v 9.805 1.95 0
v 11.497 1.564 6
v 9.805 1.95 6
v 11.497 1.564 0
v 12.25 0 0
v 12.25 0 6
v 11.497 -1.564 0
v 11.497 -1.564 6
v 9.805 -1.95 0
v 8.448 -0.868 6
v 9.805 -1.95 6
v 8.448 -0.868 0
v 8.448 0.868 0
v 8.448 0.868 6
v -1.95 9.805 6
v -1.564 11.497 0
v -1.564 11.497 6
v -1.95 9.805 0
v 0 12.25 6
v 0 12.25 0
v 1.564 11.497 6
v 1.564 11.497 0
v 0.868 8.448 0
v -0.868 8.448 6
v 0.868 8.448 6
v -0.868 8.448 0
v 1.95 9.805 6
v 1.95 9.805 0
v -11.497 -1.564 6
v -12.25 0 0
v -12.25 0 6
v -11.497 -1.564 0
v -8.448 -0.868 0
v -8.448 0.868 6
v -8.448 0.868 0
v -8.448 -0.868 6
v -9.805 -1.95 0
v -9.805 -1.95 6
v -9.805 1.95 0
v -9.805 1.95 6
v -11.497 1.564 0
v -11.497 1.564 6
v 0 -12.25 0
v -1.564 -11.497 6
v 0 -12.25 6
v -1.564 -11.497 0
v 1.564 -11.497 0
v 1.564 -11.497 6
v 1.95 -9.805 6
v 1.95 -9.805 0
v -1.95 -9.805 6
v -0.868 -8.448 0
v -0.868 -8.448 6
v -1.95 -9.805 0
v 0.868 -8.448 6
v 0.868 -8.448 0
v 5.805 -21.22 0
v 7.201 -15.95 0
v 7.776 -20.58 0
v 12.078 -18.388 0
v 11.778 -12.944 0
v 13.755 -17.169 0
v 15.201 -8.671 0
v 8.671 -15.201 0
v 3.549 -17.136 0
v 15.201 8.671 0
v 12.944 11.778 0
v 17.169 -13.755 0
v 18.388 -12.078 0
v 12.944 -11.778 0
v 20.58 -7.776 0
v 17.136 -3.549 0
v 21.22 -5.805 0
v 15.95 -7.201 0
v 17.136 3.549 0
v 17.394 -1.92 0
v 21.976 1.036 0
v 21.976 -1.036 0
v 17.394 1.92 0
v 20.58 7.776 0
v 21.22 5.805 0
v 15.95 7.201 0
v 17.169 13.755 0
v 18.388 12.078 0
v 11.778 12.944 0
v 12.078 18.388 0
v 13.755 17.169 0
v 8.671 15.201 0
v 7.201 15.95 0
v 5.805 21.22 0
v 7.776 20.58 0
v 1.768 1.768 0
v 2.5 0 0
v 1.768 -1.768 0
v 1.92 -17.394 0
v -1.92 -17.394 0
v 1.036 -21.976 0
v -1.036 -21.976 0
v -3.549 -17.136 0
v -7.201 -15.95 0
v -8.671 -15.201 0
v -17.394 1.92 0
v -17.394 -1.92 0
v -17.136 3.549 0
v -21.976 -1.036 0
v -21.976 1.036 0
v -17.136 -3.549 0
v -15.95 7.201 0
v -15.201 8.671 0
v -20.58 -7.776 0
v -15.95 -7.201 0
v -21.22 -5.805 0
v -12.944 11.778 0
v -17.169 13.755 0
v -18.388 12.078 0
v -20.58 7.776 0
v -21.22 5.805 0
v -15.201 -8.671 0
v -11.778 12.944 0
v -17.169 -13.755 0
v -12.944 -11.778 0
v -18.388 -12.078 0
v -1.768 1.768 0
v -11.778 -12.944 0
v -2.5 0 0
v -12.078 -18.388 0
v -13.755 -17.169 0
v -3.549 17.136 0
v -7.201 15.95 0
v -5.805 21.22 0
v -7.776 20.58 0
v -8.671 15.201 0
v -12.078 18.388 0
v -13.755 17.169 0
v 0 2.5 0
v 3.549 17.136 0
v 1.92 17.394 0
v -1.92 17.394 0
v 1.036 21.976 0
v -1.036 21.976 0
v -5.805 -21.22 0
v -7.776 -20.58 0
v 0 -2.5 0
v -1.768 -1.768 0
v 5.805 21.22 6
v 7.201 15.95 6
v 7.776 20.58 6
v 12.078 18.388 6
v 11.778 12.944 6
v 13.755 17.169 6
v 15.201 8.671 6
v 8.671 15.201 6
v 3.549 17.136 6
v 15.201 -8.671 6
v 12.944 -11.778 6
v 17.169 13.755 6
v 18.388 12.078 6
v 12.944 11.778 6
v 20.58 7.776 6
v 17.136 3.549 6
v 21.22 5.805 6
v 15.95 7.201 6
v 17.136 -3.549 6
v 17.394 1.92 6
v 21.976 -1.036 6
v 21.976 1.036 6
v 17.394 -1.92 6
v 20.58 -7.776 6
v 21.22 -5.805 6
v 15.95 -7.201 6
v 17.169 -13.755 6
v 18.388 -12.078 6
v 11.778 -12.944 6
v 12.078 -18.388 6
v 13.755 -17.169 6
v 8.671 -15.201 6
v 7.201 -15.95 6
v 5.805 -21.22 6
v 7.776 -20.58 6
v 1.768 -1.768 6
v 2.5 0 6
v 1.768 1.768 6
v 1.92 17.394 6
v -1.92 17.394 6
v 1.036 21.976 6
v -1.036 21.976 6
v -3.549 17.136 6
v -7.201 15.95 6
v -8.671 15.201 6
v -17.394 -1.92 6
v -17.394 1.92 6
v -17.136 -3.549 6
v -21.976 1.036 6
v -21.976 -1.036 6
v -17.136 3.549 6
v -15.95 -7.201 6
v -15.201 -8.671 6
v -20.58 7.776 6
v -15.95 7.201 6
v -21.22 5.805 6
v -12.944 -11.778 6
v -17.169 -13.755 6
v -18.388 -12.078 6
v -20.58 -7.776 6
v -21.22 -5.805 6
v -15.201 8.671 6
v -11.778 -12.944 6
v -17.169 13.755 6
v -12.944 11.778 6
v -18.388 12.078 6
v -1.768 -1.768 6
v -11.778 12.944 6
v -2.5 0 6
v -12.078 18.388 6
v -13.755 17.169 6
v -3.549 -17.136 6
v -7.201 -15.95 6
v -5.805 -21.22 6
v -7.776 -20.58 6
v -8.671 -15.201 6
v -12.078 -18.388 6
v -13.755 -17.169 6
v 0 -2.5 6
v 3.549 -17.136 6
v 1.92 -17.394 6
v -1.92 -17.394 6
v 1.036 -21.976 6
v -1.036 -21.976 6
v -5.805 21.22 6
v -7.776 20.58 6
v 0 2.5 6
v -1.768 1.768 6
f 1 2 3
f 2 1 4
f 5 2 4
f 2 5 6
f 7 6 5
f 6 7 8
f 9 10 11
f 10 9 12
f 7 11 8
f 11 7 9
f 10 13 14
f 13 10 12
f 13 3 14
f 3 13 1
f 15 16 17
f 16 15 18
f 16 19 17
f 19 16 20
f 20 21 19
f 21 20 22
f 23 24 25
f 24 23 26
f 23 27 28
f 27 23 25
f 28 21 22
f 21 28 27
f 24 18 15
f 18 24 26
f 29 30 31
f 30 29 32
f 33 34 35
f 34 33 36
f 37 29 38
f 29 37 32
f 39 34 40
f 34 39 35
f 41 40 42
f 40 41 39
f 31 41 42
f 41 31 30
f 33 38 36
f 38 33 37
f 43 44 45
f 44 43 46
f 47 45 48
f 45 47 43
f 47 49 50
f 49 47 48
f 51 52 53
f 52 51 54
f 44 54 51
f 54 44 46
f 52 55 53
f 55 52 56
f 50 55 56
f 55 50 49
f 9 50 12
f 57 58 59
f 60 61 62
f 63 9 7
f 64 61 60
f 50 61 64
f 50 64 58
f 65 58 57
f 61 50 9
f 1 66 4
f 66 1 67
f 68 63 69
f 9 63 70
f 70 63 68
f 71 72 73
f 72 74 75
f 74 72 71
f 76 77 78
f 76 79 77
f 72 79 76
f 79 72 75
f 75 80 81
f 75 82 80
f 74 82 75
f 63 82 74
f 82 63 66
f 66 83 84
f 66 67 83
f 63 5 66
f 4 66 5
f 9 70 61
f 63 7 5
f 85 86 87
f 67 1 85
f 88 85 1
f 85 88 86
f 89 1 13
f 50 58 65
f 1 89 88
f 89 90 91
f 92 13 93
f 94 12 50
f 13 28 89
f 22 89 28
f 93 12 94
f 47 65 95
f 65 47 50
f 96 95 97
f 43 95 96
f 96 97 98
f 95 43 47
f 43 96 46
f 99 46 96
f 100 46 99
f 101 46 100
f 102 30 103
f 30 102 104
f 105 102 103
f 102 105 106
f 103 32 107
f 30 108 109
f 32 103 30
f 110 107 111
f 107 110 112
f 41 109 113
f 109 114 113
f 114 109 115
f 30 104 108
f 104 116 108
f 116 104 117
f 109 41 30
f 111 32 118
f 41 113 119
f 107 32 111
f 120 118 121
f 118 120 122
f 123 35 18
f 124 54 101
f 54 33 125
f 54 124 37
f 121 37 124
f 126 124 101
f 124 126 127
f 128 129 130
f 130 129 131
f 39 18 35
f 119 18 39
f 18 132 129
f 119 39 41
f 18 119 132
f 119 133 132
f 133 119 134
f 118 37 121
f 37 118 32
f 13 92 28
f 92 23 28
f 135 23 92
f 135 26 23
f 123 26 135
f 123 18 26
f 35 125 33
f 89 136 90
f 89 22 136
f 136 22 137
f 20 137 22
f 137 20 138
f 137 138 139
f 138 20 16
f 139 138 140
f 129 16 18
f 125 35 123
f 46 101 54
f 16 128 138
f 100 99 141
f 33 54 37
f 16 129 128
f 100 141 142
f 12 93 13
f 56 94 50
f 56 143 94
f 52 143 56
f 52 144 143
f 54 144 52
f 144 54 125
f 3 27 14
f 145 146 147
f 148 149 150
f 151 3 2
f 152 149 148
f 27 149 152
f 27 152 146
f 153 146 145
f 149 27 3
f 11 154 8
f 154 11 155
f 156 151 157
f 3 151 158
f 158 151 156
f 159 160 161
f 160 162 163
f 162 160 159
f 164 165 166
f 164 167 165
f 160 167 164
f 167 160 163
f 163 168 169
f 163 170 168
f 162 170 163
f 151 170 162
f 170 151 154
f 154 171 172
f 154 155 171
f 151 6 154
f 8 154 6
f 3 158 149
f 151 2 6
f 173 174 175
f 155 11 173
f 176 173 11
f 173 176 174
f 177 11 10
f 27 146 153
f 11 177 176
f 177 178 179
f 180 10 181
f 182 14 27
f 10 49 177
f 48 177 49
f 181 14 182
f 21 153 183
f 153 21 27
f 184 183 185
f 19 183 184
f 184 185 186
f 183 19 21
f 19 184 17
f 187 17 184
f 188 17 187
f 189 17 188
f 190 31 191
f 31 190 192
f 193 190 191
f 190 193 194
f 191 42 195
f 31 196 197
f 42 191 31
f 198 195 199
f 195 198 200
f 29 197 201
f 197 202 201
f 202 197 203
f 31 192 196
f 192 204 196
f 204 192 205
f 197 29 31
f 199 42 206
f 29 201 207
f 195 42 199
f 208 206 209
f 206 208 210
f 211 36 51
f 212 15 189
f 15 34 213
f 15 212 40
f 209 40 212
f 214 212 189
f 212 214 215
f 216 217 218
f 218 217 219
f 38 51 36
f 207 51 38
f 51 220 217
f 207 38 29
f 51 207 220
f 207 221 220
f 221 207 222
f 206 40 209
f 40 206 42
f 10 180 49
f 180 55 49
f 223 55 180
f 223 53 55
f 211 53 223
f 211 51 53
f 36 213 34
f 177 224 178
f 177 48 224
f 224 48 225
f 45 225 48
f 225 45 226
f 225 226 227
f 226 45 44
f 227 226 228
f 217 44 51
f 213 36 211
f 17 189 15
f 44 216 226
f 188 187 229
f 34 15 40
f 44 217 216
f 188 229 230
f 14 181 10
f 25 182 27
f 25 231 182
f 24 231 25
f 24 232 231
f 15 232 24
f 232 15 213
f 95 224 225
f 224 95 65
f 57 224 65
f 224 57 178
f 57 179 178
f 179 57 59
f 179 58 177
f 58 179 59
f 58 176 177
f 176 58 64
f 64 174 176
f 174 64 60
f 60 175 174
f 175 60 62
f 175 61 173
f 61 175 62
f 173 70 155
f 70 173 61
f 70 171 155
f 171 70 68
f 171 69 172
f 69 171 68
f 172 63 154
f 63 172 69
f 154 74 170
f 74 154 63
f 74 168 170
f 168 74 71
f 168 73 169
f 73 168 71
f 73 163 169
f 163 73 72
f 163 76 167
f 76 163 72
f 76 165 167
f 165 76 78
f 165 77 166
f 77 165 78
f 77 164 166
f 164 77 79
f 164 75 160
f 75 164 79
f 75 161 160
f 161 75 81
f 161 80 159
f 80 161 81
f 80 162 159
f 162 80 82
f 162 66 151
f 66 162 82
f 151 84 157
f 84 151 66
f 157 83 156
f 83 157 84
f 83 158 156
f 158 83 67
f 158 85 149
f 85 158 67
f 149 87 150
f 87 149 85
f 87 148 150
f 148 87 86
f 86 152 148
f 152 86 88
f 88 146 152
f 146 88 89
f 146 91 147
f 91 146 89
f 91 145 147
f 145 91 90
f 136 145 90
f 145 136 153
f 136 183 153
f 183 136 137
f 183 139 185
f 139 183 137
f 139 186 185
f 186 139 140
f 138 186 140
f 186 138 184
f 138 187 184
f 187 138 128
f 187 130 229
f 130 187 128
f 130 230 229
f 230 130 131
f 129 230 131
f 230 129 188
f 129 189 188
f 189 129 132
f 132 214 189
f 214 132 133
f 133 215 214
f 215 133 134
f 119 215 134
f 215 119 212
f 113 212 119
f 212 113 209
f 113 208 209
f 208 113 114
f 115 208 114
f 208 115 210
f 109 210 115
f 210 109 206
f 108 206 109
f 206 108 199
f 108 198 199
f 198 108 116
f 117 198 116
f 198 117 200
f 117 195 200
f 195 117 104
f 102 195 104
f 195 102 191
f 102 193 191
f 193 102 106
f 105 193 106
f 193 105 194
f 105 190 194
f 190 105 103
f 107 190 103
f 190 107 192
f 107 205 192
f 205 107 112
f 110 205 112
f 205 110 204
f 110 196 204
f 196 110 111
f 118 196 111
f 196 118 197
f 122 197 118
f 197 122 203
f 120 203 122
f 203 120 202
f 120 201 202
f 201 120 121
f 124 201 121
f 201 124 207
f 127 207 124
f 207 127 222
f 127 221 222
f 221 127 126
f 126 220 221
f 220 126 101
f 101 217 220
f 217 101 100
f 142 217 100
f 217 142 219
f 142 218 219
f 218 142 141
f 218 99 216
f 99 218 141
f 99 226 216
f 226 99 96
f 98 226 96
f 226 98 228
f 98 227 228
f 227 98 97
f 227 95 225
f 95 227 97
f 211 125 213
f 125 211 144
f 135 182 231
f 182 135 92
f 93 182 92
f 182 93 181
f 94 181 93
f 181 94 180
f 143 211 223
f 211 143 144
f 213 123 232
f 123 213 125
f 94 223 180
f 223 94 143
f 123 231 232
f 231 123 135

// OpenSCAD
// Zweck: vereinfachtes Stirnrad – Trapezzähne als polygon aus einer Listen-Comprehension.
z = 20;          // Zähnezahl
m = 2;           // Modul
r_p = z * m / 2; // Teilkreis
r_a = r_p + m;   // Kopfkreis
r_f = r_p - 1.25 * m;
step = 360 / z;
function pt(r, a) = [r * cos(a), r * sin(a)];
tooth = function (i) let(a = i * step) [
    pt(r_f, a - 0.35 * step), pt(r_a, a - 0.15 * step),
    pt(r_a, a + 0.15 * step), pt(r_f, a + 0.35 * step)
];
outline = [for (i = [0 : z - 1]) each tooth(i)];
echo(teeth = z, r_tip = r_a, points = len(outline));
difference() {
    linear_extrude(height = 6) polygon(outline);
    translate([0, 0, -1]) cylinder(h = 8, d = 5);
    for (i = [0 : 3]) rotate([0, 0, i * 90]) translate([r_f / 2 + 1.5, 0, -1]) cylinder(h = 8, r = 2);
}
